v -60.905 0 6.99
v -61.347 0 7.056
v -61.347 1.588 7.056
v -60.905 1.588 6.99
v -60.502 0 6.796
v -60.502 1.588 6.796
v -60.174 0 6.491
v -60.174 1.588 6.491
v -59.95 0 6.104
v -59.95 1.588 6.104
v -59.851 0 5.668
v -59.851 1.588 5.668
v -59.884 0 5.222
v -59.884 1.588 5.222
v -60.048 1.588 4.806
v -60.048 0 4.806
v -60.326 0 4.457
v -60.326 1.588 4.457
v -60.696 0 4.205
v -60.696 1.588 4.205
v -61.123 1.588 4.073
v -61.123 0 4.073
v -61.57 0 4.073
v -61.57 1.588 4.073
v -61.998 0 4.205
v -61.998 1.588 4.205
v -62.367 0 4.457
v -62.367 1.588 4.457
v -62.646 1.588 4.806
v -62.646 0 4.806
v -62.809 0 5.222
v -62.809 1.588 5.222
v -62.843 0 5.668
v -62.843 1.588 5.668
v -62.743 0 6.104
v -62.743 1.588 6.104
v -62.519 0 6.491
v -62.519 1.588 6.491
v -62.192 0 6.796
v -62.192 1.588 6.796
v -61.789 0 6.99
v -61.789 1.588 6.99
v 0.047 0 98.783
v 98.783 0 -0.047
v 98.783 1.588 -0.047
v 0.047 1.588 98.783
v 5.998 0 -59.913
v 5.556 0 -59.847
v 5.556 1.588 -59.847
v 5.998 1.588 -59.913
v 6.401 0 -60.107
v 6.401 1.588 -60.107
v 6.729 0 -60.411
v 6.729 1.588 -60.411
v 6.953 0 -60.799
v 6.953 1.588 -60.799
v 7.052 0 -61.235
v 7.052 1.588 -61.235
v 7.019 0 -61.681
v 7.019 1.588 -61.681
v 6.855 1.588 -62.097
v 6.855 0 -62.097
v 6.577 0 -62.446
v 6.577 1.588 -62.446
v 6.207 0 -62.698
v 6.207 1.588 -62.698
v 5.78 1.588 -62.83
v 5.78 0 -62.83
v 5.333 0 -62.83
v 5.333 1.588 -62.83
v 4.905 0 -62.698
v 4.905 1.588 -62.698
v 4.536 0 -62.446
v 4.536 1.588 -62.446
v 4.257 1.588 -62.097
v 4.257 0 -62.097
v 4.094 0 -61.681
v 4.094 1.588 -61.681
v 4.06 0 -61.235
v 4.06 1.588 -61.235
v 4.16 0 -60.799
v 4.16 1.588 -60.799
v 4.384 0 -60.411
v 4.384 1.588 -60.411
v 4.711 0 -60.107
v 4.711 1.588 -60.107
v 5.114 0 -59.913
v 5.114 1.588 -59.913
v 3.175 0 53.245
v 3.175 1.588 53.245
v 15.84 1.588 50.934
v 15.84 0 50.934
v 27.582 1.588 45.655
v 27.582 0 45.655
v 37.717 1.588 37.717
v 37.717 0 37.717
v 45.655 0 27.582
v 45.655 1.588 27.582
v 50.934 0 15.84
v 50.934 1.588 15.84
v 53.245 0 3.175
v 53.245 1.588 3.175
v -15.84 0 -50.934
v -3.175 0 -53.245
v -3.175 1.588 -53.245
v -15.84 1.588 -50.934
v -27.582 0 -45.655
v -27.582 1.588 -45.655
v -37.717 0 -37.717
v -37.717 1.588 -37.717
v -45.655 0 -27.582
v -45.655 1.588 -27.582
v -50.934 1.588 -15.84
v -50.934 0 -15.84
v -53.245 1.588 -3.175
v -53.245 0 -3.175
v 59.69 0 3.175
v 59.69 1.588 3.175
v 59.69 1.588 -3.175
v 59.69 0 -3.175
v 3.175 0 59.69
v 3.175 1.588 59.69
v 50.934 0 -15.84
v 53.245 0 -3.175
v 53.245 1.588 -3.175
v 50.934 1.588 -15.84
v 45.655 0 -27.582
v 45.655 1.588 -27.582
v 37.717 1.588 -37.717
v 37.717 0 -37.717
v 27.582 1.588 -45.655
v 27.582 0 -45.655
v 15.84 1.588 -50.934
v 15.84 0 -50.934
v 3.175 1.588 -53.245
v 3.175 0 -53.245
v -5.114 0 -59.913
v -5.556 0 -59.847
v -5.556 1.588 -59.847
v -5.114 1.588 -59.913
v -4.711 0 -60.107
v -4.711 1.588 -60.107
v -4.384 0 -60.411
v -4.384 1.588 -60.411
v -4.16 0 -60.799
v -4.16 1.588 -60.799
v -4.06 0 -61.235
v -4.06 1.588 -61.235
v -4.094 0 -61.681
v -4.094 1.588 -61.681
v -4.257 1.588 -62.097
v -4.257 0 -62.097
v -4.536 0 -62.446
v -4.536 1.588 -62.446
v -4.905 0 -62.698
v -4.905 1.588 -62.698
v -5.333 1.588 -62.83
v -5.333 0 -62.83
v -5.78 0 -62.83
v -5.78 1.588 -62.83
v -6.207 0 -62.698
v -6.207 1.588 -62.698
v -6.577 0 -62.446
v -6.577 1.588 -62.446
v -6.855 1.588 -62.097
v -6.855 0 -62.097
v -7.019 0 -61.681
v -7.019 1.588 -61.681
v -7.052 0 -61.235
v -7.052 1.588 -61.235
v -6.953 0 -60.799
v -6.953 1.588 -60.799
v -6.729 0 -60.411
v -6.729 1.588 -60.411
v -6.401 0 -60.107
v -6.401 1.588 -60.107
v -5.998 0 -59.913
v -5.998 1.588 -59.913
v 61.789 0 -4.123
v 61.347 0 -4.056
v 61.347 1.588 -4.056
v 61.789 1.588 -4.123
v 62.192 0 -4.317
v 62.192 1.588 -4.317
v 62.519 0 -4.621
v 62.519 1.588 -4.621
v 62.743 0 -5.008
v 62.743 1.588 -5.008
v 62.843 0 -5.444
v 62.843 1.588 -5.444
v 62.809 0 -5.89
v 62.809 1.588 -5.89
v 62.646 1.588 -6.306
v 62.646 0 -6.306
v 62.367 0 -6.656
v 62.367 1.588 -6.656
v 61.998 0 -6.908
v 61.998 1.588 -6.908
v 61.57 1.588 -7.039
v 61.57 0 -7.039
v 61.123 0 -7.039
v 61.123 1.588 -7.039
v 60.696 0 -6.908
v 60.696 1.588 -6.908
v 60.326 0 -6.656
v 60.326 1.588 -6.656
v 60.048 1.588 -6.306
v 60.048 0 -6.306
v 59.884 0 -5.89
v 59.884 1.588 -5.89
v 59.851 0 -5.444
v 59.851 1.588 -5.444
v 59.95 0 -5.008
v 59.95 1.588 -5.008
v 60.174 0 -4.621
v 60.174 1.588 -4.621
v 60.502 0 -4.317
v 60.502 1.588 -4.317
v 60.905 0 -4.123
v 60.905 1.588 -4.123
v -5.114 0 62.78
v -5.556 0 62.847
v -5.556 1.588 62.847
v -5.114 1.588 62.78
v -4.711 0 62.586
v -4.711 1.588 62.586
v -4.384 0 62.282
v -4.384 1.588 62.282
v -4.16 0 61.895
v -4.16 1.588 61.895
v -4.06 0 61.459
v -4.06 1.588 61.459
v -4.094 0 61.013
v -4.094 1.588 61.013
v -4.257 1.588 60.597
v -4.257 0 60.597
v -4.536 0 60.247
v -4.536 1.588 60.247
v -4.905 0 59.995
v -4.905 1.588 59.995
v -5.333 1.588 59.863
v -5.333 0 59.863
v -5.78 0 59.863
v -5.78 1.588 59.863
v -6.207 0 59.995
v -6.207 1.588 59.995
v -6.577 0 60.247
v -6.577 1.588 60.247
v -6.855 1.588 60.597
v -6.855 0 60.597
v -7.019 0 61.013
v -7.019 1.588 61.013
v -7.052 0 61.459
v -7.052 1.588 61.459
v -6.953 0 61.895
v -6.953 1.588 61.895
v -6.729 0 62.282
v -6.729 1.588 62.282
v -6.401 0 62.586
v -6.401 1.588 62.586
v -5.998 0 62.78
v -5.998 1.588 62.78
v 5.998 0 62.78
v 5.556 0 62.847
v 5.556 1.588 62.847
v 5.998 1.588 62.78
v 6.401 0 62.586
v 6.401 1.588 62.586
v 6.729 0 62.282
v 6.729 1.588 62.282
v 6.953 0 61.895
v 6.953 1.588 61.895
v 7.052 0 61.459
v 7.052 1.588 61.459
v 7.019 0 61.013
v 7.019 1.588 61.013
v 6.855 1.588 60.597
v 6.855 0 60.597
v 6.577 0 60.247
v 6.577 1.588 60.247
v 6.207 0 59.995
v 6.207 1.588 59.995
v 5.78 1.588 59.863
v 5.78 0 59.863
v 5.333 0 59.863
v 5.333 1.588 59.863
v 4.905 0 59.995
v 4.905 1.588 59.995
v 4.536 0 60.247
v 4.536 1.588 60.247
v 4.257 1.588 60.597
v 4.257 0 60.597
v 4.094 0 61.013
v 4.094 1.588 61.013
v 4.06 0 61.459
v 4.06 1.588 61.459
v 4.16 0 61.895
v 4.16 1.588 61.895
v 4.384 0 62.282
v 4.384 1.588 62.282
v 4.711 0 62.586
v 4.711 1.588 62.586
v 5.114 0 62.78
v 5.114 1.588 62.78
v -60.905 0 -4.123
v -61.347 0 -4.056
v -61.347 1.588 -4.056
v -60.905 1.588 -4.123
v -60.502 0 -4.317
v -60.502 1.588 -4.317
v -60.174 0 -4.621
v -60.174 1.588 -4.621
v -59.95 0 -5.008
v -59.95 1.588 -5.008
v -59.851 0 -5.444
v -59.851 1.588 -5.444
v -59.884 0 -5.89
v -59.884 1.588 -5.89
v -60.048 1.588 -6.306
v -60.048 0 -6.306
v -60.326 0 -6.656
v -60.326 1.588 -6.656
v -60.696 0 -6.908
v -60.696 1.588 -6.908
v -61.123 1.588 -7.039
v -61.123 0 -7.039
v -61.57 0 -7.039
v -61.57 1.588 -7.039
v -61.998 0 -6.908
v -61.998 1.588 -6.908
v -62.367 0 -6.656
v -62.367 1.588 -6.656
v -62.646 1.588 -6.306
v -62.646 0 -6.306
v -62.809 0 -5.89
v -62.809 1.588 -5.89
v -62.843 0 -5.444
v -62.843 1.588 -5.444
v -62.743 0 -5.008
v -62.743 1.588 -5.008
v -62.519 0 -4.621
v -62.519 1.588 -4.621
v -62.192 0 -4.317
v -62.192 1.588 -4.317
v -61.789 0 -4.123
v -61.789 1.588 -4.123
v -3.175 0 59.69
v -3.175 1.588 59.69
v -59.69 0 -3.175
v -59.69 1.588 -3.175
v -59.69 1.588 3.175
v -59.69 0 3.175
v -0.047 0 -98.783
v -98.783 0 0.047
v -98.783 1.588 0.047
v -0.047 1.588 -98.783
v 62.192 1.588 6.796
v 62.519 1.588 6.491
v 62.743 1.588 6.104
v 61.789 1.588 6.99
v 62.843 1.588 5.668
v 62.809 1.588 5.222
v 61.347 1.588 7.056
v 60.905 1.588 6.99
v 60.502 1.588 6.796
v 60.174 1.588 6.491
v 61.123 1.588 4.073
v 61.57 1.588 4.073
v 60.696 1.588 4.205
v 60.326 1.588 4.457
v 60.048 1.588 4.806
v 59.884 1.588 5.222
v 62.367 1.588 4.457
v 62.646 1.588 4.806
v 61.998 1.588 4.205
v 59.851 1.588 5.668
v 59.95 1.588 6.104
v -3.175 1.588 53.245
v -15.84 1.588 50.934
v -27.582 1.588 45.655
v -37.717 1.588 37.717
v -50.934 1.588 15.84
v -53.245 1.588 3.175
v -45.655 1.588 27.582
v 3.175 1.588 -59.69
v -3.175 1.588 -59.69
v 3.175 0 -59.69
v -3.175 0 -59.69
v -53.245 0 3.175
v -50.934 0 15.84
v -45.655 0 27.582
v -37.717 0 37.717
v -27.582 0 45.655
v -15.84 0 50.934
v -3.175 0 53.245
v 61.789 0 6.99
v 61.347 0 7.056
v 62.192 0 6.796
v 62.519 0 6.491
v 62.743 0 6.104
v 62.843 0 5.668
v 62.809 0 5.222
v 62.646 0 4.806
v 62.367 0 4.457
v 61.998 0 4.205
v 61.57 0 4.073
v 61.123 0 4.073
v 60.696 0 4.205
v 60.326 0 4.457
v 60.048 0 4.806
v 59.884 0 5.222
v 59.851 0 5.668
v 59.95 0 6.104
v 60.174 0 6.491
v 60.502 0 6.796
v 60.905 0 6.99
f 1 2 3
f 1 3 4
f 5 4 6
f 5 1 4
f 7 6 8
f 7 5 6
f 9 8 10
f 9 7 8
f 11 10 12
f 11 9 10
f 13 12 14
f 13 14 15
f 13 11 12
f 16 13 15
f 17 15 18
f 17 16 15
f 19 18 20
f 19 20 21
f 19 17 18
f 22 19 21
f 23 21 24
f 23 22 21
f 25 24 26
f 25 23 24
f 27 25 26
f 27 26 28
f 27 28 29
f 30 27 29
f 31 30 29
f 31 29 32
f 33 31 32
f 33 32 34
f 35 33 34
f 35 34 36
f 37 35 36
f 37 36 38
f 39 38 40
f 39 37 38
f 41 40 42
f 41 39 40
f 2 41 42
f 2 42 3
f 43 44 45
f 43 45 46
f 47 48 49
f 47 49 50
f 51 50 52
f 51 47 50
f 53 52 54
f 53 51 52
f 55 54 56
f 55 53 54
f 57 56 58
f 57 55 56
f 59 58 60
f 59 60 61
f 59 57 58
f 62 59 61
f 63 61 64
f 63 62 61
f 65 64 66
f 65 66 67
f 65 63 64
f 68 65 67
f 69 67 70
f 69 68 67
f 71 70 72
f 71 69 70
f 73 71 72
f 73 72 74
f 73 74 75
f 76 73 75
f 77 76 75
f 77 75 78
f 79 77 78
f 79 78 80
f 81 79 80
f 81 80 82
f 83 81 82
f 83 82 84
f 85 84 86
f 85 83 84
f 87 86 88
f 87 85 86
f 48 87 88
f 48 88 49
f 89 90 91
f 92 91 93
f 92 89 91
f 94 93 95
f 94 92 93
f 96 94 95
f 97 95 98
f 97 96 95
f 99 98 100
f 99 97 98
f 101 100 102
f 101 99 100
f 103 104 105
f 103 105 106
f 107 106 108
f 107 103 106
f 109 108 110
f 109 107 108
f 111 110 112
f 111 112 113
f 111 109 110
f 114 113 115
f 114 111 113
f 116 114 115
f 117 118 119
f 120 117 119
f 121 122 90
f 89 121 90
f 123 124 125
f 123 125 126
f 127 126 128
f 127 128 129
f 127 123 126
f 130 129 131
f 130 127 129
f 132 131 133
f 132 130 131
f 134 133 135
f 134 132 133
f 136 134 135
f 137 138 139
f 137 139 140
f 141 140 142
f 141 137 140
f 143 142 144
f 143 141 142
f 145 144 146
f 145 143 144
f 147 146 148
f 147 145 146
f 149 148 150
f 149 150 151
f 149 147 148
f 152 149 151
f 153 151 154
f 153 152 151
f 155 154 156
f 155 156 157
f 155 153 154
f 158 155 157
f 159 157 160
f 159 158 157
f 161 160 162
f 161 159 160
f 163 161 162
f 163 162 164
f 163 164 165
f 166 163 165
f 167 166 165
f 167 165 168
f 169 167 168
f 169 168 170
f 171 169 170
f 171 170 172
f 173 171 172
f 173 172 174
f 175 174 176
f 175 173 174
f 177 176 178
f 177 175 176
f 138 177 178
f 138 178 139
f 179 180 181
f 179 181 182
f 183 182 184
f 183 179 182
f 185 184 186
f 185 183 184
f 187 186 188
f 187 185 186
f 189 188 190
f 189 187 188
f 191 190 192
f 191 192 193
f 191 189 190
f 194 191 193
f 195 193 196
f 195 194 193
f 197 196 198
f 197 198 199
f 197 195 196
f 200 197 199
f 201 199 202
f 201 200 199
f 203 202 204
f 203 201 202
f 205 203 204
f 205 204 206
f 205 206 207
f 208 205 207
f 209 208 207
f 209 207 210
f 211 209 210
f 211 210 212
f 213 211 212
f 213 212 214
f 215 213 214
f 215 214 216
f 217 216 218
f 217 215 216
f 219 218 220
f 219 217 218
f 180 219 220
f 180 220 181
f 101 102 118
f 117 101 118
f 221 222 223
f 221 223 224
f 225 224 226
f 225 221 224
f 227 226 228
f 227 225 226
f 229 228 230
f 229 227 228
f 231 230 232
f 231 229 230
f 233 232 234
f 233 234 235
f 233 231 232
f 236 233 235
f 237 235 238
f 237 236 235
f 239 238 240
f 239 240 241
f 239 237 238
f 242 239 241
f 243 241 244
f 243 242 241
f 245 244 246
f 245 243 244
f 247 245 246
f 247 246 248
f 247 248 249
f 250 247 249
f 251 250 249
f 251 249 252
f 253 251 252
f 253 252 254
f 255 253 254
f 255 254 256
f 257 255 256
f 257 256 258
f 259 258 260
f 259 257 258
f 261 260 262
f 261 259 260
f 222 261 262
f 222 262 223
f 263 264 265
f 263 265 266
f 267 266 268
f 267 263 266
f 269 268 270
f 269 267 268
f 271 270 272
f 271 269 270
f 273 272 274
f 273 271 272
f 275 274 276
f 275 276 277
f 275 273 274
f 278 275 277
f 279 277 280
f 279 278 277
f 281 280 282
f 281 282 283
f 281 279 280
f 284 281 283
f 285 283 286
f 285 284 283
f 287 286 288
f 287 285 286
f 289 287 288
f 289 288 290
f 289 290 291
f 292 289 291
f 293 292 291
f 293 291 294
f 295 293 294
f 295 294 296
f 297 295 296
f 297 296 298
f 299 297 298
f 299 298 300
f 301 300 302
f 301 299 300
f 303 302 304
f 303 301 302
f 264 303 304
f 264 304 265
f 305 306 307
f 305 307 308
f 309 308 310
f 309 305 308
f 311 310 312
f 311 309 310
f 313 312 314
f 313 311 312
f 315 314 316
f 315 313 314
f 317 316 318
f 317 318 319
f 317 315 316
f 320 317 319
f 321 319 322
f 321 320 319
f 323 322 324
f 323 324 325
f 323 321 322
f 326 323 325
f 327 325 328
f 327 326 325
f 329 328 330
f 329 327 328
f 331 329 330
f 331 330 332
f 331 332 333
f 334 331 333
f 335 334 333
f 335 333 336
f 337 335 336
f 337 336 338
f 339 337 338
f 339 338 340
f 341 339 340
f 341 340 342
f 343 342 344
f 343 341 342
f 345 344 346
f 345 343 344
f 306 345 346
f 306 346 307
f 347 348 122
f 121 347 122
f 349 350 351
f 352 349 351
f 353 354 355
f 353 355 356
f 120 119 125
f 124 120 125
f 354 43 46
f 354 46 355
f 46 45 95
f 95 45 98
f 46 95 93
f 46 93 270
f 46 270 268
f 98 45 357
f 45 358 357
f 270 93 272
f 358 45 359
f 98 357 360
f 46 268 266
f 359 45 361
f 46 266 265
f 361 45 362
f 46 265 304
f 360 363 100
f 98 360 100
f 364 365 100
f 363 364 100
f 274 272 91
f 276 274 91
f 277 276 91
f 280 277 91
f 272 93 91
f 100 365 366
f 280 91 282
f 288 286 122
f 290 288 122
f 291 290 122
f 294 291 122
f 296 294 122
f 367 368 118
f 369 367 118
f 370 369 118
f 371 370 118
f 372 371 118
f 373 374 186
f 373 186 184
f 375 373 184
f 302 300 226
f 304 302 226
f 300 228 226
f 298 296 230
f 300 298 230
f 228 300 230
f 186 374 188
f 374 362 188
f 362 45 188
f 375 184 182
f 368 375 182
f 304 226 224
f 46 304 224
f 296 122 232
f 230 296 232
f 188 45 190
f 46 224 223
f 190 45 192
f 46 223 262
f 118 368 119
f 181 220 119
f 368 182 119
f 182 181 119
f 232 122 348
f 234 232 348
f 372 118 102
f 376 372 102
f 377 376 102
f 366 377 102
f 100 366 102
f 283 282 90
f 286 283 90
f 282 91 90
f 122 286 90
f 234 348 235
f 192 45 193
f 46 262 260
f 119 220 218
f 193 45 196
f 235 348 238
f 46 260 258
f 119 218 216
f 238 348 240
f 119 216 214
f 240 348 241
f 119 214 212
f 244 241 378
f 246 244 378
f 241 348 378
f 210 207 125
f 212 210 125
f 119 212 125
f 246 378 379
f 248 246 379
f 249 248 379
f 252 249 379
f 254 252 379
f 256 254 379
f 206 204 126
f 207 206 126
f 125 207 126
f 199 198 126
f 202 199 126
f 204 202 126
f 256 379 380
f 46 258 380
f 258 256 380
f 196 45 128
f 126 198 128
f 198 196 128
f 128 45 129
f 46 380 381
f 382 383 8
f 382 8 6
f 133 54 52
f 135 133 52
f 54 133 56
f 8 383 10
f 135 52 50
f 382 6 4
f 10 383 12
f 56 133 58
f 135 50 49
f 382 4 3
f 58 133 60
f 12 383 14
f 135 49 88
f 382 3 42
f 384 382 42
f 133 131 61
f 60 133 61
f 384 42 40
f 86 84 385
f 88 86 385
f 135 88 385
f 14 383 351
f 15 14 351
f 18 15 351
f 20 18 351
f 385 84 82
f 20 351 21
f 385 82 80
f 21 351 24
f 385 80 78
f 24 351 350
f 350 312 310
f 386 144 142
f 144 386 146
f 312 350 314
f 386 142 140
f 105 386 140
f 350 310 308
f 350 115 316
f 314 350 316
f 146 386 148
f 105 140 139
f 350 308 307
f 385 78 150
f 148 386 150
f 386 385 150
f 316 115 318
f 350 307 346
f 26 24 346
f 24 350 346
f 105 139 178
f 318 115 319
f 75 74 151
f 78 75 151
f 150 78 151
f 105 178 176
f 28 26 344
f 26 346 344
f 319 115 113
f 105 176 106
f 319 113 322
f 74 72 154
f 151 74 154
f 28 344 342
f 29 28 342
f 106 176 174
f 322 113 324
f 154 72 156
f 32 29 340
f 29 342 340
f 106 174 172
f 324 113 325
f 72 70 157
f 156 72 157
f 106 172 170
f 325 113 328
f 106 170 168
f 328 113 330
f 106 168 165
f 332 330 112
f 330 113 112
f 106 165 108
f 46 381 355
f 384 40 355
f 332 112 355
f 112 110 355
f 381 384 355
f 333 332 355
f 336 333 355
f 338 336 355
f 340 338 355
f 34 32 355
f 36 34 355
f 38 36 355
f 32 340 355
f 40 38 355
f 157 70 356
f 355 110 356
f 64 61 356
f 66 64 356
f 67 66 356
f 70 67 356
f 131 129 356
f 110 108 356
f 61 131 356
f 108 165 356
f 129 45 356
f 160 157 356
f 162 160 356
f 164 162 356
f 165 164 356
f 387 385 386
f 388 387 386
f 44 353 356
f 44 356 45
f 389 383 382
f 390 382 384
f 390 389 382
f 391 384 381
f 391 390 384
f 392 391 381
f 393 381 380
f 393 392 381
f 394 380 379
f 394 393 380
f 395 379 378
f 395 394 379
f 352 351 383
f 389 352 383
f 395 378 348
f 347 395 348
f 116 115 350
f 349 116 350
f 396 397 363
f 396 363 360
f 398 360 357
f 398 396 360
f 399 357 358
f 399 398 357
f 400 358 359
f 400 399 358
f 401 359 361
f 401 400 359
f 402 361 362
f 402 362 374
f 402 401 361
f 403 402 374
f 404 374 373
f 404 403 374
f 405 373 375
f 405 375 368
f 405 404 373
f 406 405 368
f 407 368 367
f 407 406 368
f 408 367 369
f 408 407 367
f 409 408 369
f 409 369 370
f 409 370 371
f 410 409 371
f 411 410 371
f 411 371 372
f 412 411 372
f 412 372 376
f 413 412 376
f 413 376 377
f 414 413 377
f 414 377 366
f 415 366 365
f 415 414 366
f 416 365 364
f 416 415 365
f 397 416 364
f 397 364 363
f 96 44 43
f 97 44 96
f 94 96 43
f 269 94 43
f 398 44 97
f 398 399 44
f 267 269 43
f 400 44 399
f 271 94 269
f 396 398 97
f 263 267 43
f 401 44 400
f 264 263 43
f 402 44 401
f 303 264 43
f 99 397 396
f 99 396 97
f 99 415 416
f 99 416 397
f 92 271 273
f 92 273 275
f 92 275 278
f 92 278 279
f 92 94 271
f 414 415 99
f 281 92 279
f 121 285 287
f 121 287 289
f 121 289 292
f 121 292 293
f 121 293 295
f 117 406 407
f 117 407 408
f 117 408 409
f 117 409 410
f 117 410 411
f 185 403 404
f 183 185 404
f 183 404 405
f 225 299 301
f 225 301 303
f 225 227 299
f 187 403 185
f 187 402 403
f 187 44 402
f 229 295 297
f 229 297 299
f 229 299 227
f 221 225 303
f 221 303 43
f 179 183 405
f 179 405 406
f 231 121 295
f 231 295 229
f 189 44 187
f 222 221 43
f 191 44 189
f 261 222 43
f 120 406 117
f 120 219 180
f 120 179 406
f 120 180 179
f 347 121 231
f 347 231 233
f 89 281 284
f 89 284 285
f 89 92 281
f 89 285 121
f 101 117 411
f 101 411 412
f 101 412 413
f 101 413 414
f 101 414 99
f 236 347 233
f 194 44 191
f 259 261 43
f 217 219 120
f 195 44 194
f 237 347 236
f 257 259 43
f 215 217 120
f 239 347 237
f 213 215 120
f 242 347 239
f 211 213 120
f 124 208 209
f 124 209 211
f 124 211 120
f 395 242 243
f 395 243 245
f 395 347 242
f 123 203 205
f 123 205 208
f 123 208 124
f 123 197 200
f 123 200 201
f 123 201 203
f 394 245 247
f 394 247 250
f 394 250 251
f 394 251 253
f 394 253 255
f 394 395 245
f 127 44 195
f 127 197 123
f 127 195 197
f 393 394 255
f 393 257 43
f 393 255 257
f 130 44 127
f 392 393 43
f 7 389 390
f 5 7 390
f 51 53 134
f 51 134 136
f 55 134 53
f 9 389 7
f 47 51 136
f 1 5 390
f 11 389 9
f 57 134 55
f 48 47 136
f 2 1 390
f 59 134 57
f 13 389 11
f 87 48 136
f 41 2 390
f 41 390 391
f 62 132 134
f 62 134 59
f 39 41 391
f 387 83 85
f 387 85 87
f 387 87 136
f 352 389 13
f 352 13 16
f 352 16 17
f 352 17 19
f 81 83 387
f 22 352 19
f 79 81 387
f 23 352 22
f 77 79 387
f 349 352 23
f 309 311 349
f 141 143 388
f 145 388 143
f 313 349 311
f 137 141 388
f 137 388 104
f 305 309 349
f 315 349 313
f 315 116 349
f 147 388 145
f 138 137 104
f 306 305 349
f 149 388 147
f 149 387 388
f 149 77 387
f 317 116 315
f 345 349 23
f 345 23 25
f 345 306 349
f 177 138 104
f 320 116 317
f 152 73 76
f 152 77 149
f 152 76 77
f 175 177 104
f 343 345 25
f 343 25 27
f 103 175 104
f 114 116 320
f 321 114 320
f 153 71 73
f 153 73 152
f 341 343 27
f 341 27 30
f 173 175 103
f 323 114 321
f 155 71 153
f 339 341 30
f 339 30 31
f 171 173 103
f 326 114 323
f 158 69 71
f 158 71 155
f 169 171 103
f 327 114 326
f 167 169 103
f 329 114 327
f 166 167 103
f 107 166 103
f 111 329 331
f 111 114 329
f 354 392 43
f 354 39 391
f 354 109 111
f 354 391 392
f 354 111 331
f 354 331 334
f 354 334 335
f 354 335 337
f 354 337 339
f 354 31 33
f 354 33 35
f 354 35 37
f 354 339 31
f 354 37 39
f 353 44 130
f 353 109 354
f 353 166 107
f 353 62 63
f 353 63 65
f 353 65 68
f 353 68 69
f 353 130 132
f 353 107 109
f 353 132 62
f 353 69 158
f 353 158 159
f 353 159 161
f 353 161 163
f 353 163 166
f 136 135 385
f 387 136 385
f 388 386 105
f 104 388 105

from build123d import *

# Parameters (mm, degrees)
SKETCH1_R           = 1.5
SKETCH1_R_2         = 53.34
BOSS_EXTRUDE1_DEPTH = 1.5875
CUT_EXTRUDE3_DEPTH  = 140.70900378


with BuildPart() as part:
    # Sketch1 → Boss-Extrude1 (new body)
    with BuildSketch(Plane(origin=(0, 0, 0), x_dir=(1, 0, 0), z_dir=(0, 1, 0))):
        Polygon((0.047005036, -98.782806148), (-98.782806148, -0.047005036), (-0.047005036, 98.782806148), (98.782806148, 0.047005036), align=None)
        with Locations(Location((-61.346730494, 5.55625, 0), (0, 0, 270))):
            Circle(SKETCH1_R, mode=Mode.SUBTRACT)
        with Locations(Location((-61.346730494, -5.55625, 0), (0, 0, 270))):
            Circle(SKETCH1_R, mode=Mode.SUBTRACT)
        with Locations(Location((-5.55625, -61.346730494, 0), (0, 0, 270))):
            Circle(SKETCH1_R, mode=Mode.SUBTRACT)
        with Locations(Location((5.55625, -61.346730494, 0), (0, 0, 270))):
            Circle(SKETCH1_R, mode=Mode.SUBTRACT)
        with Locations(Location((61.346730494, -5.55625, 0), (0, 0, 270))):
            Circle(SKETCH1_R, mode=Mode.SUBTRACT)
        with Locations(Location((61.346730494, 5.55625, 0), (0, 0, 270))):
            Circle(SKETCH1_R, mode=Mode.SUBTRACT)
        with Locations(Location((5.55625, 61.346730494, 0), (0, 0, 270))):
            Circle(SKETCH1_R, mode=Mode.SUBTRACT)
        with Locations(Location((-5.55625, 61.346730494, 0), (0, 0, 270))):
            Circle(SKETCH1_R, mode=Mode.SUBTRACT)
        with Locations(Location((0, 0, 0), (0, 0, 270))):
            Circle(SKETCH1_R_2, mode=Mode.SUBTRACT)
    extrude(amount=BOSS_EXTRUDE1_DEPTH)

    # Sketch2 → Cut-Extrude3 (cut, through all)
    with BuildSketch(Plane(origin=(0, 1.5875, 0), x_dir=(1, 0, 0), z_dir=(0, 1, 0))):
        Polygon((3.175, 53.34), (3.175, 59.69), (-3.175, 59.69), (-3.175, 53.34), (-3.175, 52.244537665), (3.175, 52.244537665), align=None)
        Polygon((53.34, -3.175), (59.69, -3.175), (59.69, 3.175), (53.34, 3.175), (52.244537665, 3.175), (52.244537665, -3.175), align=None)
        Polygon((-3.175, -53.34), (-3.175, -59.69), (3.175, -59.69), (3.175, -53.34), (3.175, -52.244537665), (-3.175, -52.244537665), align=None)
        Polygon((-53.34, 3.175), (-59.69, 3.175), (-59.69, -3.175), (-53.34, -3.175), (-52.244537665, -3.175), (-52.244537665, 3.175), align=None)
    extrude(amount=-CUT_EXTRUDE3_DEPTH, mode=Mode.SUBTRACT)


solid = part.part
